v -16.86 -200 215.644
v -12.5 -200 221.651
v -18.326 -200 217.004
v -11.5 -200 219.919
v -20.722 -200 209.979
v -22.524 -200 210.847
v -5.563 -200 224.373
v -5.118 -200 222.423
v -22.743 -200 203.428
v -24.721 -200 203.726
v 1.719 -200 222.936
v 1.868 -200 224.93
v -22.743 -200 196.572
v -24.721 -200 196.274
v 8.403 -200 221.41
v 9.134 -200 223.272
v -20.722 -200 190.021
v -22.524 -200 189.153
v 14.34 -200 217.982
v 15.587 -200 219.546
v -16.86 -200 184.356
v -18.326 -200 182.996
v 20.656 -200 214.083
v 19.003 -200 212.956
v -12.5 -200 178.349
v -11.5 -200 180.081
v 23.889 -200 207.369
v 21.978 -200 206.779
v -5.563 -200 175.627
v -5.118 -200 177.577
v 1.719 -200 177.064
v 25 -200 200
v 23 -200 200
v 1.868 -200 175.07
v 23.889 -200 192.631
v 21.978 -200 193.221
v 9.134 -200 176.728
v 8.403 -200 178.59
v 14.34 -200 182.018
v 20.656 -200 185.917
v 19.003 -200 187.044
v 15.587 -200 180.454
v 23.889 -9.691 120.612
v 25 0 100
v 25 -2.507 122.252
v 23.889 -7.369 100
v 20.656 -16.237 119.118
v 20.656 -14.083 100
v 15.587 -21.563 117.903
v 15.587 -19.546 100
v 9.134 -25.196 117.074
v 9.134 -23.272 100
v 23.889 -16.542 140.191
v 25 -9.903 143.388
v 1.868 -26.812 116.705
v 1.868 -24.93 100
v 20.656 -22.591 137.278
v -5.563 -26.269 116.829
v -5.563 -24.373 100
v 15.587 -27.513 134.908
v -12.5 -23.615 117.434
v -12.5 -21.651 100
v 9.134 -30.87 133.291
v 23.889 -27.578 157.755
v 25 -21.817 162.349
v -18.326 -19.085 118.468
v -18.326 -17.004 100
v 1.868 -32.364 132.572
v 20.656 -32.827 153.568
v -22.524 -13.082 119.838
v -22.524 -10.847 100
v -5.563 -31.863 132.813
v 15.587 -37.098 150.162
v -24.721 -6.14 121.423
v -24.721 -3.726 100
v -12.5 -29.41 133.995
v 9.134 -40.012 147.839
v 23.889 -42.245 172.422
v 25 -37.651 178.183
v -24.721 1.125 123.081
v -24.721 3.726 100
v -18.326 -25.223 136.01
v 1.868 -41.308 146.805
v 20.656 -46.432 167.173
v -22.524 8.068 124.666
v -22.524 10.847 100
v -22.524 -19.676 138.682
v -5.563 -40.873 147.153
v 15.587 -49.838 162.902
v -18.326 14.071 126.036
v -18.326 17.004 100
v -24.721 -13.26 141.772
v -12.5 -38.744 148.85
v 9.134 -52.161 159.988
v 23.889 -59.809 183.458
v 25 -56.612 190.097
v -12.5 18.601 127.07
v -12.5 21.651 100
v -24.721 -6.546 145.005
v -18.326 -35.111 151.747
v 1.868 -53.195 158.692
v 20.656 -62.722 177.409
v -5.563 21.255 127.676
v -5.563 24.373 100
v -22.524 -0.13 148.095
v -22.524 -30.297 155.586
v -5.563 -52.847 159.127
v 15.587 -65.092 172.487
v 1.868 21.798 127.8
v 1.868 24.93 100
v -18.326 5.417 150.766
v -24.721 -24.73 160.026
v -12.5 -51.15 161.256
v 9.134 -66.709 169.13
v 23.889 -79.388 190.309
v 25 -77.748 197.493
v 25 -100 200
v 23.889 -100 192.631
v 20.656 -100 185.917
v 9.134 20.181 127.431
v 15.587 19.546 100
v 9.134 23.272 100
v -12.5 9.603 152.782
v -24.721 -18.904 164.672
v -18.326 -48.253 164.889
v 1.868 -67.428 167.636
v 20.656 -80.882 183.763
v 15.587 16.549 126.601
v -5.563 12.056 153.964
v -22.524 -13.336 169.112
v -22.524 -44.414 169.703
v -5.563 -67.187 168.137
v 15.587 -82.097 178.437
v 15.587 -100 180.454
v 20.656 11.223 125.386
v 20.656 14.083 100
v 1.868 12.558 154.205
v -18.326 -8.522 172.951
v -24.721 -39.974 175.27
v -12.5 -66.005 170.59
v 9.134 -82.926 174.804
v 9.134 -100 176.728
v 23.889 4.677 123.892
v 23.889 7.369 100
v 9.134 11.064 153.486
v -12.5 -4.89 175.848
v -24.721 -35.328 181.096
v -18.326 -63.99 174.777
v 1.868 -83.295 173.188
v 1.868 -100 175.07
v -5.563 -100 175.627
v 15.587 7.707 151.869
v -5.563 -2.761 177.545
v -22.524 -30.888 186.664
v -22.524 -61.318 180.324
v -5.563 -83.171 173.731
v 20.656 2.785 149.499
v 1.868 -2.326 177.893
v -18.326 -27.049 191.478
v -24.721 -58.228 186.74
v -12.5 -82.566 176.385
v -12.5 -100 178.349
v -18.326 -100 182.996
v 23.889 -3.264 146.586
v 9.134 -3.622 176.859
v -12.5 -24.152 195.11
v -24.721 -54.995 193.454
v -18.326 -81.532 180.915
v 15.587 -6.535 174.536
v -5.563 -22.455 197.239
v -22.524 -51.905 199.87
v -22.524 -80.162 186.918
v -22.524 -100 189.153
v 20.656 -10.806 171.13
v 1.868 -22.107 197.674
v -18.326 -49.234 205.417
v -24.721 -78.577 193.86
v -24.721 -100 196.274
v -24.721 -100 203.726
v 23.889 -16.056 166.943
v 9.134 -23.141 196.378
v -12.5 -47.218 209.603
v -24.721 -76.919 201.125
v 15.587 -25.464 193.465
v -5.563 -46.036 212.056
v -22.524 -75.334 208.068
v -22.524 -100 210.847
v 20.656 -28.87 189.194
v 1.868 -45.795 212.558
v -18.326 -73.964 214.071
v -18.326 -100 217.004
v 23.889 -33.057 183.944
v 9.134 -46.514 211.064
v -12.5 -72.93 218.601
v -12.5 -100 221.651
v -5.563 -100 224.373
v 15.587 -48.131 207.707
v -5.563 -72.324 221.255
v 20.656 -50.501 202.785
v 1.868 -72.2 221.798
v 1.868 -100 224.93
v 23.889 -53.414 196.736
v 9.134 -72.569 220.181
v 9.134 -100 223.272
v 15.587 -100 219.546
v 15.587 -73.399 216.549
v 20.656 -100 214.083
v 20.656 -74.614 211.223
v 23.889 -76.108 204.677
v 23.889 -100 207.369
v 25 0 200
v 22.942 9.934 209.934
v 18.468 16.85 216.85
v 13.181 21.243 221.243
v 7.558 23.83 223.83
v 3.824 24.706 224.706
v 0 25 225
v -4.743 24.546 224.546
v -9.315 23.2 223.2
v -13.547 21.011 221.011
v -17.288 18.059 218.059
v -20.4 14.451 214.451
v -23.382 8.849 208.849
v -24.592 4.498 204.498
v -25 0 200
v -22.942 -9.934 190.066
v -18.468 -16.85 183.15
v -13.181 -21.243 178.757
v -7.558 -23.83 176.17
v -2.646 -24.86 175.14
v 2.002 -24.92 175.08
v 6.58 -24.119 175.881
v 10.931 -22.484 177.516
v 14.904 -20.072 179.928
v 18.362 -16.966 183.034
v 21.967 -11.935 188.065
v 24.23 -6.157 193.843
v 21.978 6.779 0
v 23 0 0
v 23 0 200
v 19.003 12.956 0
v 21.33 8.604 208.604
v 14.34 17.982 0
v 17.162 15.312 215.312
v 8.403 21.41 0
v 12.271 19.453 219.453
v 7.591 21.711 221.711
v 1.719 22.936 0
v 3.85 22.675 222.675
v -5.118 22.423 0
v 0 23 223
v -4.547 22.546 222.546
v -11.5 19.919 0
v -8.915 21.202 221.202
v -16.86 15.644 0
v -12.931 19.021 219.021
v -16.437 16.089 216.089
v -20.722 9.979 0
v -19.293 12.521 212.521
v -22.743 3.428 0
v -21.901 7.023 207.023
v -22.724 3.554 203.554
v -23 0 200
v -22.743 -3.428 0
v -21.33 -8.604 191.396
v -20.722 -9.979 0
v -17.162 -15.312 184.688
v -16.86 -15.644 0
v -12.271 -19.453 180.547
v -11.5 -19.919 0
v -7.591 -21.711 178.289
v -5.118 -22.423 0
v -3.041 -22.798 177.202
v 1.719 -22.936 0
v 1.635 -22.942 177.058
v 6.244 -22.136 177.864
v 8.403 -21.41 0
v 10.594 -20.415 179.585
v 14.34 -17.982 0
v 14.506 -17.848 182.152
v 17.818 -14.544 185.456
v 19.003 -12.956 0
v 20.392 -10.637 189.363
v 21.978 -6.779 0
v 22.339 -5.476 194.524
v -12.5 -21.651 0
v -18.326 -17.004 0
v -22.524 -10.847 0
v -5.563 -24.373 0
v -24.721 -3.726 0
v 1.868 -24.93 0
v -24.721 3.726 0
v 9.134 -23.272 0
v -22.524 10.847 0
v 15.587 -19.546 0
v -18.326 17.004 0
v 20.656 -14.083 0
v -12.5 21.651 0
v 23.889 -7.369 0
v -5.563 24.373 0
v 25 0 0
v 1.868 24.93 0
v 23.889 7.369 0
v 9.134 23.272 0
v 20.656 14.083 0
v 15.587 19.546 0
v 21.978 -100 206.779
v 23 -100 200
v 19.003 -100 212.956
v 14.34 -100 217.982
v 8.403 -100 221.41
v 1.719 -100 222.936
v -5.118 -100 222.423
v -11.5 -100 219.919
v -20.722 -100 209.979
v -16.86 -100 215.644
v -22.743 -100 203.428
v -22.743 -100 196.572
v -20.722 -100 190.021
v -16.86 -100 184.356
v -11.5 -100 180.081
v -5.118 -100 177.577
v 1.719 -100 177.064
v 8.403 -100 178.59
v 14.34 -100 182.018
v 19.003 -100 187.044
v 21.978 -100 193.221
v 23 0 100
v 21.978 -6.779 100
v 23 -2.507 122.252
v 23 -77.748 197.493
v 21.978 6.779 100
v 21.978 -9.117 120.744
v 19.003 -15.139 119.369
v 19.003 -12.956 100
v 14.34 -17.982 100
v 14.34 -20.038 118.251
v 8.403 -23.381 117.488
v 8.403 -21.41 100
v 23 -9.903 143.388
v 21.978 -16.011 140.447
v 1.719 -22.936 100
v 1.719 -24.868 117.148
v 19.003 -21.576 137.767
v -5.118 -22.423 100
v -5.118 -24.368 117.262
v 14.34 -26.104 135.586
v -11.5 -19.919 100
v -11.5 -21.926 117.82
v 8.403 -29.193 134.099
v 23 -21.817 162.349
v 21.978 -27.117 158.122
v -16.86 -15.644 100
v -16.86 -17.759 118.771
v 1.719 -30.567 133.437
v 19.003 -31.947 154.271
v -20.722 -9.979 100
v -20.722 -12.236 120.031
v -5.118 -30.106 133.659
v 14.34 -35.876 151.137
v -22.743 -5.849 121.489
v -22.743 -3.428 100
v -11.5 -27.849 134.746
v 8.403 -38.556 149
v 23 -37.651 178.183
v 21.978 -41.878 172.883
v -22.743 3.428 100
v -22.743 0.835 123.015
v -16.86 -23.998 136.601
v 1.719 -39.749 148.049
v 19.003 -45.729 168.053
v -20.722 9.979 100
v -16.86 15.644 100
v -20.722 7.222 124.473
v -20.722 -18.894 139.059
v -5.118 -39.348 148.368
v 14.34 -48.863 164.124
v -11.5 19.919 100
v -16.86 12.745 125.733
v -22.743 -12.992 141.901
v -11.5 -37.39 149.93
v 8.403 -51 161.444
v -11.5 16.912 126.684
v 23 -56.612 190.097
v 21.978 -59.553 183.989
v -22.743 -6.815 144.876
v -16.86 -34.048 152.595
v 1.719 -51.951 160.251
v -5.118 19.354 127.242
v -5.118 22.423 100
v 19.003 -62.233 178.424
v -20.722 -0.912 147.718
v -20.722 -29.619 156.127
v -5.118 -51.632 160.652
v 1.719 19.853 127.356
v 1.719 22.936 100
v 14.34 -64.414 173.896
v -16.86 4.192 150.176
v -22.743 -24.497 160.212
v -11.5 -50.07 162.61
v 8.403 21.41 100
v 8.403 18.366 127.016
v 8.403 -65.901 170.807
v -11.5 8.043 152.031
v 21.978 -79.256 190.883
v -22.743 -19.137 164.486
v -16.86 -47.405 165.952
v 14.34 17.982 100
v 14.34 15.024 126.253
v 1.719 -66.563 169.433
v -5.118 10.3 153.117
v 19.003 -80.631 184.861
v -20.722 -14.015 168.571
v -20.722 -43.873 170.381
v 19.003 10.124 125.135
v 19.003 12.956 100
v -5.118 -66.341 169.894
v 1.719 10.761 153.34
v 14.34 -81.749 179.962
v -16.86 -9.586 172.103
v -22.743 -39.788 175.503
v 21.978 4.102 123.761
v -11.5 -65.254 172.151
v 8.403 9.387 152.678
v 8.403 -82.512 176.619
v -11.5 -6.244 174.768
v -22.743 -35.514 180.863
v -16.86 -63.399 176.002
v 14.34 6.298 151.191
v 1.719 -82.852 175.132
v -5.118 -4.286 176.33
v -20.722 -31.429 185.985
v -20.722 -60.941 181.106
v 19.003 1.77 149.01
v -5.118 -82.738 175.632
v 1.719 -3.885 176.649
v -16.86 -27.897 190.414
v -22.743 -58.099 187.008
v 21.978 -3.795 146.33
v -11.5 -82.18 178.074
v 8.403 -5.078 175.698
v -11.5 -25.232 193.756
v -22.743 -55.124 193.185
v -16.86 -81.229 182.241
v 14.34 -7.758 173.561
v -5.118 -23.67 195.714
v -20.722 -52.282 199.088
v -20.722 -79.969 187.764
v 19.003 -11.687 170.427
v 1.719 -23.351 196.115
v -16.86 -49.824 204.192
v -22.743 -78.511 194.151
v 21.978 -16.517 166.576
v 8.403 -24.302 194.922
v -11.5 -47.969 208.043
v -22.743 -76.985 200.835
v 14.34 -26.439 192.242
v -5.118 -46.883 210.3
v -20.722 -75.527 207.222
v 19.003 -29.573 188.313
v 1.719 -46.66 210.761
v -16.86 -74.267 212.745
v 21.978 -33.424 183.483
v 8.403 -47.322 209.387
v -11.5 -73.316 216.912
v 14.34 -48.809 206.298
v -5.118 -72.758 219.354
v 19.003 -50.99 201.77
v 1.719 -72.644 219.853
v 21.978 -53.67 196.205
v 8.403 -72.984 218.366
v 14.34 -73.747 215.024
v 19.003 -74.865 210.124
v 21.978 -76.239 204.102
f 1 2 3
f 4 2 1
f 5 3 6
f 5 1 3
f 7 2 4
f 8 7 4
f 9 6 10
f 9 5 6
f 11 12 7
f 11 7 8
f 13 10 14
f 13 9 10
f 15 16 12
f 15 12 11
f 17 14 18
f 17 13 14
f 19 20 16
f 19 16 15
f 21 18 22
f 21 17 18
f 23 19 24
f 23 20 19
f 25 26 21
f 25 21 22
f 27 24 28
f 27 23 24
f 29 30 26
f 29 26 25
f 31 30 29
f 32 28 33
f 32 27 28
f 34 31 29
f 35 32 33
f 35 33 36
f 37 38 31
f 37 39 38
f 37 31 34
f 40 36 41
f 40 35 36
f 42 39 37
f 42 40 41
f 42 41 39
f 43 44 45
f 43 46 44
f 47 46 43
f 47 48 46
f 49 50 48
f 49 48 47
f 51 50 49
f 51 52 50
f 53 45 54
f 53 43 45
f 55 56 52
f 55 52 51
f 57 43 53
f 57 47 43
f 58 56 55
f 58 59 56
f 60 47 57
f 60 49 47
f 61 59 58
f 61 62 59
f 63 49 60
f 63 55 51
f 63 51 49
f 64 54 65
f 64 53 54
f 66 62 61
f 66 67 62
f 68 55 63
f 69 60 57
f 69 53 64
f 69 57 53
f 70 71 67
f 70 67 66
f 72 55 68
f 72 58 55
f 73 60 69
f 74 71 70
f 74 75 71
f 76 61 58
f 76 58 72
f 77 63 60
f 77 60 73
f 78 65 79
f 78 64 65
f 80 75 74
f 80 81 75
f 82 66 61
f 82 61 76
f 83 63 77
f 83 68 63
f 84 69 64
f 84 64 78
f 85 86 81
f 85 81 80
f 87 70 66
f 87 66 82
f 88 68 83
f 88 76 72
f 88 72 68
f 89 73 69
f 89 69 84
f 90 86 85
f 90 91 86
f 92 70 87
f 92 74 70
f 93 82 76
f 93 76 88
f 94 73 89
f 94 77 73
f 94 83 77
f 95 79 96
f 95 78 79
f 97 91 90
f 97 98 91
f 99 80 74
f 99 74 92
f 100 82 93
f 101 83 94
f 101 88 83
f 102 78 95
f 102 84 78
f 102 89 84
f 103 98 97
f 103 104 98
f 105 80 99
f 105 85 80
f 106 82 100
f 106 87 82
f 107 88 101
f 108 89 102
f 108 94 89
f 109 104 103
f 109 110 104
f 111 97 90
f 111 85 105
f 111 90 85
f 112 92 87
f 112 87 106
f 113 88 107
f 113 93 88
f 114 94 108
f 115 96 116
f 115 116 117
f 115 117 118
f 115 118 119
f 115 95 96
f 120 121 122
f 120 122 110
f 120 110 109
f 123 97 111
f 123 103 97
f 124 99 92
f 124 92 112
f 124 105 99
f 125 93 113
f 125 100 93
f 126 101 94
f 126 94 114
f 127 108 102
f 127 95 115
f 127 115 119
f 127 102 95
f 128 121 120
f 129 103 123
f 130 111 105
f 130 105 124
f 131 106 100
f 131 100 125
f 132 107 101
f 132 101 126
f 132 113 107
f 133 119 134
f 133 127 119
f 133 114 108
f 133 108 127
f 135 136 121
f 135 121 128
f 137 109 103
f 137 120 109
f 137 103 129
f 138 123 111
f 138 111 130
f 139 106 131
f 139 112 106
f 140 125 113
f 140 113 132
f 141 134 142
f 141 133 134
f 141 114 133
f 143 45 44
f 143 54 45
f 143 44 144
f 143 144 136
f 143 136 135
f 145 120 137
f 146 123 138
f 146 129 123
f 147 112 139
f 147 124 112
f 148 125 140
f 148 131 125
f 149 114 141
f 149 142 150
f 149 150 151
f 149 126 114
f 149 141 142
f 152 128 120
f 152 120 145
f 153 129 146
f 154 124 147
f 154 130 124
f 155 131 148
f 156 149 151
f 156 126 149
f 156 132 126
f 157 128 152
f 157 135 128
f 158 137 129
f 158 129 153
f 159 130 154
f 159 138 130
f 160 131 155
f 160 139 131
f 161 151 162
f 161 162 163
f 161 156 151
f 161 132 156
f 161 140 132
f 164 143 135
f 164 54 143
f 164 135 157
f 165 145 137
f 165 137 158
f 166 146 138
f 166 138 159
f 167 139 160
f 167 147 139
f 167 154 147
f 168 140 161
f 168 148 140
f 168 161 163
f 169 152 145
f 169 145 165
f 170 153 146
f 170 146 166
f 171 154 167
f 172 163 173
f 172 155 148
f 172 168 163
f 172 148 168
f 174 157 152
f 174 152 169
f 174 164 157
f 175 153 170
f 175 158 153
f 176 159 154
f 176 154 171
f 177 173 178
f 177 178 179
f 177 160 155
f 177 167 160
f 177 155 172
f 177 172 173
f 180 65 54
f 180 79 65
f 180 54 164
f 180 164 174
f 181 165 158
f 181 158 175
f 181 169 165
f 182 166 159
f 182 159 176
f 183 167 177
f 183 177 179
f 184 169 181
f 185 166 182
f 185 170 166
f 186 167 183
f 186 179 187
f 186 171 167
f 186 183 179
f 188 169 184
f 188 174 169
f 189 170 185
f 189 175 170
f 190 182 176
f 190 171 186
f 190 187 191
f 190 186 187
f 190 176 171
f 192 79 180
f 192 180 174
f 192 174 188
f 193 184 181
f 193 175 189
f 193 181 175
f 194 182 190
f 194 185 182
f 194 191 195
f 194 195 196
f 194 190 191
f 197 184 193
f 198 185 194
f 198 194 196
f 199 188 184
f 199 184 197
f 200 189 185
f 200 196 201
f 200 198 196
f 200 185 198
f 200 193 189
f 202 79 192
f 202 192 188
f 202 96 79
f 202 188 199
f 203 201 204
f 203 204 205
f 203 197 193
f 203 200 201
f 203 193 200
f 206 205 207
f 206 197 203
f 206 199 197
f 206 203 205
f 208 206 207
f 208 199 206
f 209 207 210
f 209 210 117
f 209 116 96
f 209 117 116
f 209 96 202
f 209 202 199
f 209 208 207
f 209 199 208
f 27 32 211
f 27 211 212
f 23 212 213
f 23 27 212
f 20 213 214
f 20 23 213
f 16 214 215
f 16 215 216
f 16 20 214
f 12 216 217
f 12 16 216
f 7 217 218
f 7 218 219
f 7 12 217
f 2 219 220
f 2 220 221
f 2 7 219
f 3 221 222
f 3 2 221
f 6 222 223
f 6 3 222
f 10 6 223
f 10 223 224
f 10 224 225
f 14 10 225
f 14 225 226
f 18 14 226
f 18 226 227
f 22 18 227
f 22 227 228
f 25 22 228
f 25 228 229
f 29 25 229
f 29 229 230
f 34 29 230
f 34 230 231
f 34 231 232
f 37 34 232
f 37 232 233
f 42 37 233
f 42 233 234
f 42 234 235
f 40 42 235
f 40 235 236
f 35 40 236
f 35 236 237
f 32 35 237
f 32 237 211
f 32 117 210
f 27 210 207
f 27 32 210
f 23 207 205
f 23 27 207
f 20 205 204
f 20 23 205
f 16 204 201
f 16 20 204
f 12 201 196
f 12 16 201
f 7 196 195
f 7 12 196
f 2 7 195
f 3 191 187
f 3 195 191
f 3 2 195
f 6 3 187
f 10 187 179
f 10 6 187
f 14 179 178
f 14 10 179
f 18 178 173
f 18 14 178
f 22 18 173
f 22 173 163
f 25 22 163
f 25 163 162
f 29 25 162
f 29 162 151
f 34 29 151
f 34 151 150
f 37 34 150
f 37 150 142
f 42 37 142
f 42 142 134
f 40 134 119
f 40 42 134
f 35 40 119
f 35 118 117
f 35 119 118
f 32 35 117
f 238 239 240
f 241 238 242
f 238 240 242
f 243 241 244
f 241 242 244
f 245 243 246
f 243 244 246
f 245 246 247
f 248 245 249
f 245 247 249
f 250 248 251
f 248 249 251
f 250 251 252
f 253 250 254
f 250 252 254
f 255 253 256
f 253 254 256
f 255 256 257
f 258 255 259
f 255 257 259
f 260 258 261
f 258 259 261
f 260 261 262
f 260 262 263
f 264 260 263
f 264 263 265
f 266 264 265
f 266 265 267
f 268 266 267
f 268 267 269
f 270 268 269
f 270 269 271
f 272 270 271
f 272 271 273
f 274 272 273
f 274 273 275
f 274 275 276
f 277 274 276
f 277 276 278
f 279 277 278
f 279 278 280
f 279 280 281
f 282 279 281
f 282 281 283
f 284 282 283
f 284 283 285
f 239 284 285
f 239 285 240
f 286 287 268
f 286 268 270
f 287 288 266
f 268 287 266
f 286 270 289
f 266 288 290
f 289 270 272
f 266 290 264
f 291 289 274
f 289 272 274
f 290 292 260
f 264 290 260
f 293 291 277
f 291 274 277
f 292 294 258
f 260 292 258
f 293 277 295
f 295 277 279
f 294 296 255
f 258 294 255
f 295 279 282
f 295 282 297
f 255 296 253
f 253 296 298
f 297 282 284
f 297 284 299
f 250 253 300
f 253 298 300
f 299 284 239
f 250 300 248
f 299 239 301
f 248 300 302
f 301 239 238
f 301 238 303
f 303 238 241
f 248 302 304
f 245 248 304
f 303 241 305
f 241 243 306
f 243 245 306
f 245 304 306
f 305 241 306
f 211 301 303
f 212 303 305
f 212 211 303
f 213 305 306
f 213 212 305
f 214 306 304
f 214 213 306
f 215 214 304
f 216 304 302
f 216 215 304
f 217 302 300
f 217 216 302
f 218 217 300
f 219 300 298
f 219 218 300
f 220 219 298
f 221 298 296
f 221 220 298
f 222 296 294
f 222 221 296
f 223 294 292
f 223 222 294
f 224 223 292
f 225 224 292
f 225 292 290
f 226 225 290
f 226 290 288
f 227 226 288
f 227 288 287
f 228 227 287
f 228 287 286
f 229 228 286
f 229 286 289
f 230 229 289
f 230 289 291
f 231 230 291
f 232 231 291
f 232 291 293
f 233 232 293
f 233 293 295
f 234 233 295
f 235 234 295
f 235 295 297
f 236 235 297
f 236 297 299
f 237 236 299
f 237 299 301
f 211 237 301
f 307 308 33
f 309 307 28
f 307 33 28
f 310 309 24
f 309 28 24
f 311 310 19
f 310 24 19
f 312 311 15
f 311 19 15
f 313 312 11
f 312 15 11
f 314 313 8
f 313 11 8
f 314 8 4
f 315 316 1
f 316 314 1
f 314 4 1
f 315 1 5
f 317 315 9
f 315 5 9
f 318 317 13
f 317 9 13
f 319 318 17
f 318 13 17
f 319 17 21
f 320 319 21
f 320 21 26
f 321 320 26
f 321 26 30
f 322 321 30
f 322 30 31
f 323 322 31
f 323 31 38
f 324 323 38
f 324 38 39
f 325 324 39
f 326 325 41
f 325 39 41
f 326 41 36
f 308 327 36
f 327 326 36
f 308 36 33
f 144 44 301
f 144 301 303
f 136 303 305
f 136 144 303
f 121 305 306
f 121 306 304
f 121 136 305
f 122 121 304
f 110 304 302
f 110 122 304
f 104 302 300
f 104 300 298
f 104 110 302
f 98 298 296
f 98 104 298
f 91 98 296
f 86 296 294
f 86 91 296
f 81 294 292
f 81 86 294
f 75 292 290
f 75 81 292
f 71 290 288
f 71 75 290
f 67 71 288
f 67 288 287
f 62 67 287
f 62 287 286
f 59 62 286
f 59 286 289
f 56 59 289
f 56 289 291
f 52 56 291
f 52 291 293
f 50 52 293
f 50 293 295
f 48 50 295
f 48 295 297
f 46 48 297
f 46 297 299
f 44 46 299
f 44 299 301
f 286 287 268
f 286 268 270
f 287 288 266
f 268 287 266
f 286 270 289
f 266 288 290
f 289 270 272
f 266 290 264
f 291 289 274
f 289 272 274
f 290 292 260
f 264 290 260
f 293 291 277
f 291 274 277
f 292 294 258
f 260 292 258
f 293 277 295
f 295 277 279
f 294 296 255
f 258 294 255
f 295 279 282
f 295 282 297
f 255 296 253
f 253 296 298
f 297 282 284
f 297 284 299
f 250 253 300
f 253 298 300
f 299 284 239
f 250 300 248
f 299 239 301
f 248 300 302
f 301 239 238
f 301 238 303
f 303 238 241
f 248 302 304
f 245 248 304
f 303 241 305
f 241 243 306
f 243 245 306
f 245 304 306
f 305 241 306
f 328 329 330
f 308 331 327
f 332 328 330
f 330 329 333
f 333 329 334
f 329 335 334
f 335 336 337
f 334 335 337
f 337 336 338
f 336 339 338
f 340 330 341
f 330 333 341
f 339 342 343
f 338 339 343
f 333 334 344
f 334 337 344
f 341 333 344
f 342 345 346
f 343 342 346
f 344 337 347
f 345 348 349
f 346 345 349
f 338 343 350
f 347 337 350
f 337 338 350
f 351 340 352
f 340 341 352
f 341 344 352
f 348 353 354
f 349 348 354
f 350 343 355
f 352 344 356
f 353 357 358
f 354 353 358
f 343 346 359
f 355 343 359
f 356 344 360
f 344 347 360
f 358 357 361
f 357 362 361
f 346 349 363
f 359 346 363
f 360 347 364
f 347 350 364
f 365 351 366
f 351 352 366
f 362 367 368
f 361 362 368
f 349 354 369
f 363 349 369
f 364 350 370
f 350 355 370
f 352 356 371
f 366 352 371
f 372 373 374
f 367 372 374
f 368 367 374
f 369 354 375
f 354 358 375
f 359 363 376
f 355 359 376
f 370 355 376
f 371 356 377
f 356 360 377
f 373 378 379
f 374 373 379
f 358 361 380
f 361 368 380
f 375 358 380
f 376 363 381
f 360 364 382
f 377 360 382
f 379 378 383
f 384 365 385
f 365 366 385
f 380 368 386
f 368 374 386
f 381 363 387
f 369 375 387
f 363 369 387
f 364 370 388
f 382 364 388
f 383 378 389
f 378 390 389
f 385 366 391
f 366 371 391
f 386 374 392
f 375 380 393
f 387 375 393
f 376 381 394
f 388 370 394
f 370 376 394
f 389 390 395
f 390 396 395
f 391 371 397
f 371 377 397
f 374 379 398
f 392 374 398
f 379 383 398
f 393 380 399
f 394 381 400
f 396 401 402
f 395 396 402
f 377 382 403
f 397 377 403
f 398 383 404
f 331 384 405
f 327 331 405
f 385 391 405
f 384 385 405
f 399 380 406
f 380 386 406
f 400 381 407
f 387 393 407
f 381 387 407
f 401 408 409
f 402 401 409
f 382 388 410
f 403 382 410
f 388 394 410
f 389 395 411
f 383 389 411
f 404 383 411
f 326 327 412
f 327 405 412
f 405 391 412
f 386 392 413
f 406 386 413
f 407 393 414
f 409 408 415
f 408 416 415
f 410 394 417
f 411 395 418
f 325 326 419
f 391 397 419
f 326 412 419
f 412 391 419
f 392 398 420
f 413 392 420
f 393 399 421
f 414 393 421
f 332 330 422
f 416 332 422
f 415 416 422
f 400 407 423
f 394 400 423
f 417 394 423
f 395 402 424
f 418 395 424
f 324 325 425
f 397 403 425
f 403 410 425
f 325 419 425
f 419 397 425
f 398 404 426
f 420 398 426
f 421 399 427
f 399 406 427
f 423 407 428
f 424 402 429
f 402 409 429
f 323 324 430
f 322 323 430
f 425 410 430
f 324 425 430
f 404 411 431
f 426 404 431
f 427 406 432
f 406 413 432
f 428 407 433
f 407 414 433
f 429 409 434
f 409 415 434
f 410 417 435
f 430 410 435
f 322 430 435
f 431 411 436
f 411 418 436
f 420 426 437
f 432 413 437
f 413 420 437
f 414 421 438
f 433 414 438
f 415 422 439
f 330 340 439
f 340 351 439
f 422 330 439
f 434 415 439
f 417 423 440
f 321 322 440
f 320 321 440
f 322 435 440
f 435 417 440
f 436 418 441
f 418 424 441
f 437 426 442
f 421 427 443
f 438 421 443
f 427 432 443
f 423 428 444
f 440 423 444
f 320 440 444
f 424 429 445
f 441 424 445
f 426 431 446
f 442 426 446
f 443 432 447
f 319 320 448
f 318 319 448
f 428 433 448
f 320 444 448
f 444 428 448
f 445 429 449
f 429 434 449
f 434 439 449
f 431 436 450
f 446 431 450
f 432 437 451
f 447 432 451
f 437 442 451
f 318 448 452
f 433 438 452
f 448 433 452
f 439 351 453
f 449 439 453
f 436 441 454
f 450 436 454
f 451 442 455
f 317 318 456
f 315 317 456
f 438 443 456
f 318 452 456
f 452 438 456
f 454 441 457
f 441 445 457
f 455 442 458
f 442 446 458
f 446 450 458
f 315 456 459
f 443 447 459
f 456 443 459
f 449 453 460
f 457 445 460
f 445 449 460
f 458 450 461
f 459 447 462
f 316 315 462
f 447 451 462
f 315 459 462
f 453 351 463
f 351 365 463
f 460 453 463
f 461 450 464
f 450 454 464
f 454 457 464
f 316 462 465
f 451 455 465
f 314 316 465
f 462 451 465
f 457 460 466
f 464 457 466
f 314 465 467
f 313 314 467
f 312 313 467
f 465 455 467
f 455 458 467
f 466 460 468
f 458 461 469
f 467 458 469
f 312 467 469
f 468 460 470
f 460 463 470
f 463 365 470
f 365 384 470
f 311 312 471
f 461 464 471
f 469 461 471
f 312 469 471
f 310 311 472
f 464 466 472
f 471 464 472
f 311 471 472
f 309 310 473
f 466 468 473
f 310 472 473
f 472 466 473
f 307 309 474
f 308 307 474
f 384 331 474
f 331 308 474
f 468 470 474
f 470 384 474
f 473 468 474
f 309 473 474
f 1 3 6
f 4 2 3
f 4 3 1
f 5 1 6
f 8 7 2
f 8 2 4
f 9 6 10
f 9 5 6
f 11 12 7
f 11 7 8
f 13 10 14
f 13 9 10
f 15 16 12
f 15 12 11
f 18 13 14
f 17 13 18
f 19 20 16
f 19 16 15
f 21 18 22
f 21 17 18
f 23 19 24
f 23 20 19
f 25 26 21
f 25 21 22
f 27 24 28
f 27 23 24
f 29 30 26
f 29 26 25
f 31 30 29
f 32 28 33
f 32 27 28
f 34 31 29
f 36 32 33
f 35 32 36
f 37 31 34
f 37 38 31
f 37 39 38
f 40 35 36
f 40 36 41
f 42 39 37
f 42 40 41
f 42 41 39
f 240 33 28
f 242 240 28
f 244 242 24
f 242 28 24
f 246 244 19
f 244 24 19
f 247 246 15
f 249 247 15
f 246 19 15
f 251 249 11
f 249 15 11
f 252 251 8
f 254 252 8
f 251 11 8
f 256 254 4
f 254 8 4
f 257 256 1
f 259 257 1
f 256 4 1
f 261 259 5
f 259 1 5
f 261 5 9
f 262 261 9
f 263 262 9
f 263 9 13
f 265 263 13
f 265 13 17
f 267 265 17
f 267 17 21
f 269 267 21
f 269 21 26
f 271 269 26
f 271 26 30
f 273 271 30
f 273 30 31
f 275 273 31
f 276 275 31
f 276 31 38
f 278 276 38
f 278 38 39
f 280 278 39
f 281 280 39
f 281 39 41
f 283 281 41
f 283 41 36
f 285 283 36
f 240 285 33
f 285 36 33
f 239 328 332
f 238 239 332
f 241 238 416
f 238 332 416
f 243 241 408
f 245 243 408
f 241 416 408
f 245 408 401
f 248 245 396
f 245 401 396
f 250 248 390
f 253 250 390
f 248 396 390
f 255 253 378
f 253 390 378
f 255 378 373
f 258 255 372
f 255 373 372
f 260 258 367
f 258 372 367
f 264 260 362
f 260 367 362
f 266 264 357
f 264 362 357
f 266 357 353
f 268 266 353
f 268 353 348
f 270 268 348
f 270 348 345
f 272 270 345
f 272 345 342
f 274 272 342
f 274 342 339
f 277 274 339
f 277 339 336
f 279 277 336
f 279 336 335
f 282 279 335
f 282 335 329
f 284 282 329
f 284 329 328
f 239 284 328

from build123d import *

# Parameters (mm, degrees)
F0_R   = 25
F0_R_2 = 23


with BuildPart() as f2:
    # F2: sweep along a path in F1
    with BuildLine(Plane.YZ) as f2_path:
        Line((0, 0), (0, 100))
        ThreePointArc((0, 100), (-29.2893218813, 170.7106781187), (-100, 200))
        Line((-100, 200), (-200, 200))
    # F0 (on Top) → F2 (sweep)
    with BuildSketch(Plane.XY):
        Circle(F0_R)
        Circle(F0_R_2, mode=Mode.SUBTRACT)
    sweep(path=f2_path.line)


with BuildPart() as f4:
    # F4: sweep along a path in F3
    with BuildLine(Plane.YZ) as f4_path:
        Line((0, 0), (0, 200))
        Line((0, 200), (-200, 200))
    # F0 (on Top) → F4 (sweep)
    with BuildSketch(Plane.XY):
        Circle(F0_R)
        Circle(F0_R_2, mode=Mode.SUBTRACT)
    sweep(path=f4_path.line, transition=Transition.RIGHT)


solid = Compound([f2.part, f4.part])
